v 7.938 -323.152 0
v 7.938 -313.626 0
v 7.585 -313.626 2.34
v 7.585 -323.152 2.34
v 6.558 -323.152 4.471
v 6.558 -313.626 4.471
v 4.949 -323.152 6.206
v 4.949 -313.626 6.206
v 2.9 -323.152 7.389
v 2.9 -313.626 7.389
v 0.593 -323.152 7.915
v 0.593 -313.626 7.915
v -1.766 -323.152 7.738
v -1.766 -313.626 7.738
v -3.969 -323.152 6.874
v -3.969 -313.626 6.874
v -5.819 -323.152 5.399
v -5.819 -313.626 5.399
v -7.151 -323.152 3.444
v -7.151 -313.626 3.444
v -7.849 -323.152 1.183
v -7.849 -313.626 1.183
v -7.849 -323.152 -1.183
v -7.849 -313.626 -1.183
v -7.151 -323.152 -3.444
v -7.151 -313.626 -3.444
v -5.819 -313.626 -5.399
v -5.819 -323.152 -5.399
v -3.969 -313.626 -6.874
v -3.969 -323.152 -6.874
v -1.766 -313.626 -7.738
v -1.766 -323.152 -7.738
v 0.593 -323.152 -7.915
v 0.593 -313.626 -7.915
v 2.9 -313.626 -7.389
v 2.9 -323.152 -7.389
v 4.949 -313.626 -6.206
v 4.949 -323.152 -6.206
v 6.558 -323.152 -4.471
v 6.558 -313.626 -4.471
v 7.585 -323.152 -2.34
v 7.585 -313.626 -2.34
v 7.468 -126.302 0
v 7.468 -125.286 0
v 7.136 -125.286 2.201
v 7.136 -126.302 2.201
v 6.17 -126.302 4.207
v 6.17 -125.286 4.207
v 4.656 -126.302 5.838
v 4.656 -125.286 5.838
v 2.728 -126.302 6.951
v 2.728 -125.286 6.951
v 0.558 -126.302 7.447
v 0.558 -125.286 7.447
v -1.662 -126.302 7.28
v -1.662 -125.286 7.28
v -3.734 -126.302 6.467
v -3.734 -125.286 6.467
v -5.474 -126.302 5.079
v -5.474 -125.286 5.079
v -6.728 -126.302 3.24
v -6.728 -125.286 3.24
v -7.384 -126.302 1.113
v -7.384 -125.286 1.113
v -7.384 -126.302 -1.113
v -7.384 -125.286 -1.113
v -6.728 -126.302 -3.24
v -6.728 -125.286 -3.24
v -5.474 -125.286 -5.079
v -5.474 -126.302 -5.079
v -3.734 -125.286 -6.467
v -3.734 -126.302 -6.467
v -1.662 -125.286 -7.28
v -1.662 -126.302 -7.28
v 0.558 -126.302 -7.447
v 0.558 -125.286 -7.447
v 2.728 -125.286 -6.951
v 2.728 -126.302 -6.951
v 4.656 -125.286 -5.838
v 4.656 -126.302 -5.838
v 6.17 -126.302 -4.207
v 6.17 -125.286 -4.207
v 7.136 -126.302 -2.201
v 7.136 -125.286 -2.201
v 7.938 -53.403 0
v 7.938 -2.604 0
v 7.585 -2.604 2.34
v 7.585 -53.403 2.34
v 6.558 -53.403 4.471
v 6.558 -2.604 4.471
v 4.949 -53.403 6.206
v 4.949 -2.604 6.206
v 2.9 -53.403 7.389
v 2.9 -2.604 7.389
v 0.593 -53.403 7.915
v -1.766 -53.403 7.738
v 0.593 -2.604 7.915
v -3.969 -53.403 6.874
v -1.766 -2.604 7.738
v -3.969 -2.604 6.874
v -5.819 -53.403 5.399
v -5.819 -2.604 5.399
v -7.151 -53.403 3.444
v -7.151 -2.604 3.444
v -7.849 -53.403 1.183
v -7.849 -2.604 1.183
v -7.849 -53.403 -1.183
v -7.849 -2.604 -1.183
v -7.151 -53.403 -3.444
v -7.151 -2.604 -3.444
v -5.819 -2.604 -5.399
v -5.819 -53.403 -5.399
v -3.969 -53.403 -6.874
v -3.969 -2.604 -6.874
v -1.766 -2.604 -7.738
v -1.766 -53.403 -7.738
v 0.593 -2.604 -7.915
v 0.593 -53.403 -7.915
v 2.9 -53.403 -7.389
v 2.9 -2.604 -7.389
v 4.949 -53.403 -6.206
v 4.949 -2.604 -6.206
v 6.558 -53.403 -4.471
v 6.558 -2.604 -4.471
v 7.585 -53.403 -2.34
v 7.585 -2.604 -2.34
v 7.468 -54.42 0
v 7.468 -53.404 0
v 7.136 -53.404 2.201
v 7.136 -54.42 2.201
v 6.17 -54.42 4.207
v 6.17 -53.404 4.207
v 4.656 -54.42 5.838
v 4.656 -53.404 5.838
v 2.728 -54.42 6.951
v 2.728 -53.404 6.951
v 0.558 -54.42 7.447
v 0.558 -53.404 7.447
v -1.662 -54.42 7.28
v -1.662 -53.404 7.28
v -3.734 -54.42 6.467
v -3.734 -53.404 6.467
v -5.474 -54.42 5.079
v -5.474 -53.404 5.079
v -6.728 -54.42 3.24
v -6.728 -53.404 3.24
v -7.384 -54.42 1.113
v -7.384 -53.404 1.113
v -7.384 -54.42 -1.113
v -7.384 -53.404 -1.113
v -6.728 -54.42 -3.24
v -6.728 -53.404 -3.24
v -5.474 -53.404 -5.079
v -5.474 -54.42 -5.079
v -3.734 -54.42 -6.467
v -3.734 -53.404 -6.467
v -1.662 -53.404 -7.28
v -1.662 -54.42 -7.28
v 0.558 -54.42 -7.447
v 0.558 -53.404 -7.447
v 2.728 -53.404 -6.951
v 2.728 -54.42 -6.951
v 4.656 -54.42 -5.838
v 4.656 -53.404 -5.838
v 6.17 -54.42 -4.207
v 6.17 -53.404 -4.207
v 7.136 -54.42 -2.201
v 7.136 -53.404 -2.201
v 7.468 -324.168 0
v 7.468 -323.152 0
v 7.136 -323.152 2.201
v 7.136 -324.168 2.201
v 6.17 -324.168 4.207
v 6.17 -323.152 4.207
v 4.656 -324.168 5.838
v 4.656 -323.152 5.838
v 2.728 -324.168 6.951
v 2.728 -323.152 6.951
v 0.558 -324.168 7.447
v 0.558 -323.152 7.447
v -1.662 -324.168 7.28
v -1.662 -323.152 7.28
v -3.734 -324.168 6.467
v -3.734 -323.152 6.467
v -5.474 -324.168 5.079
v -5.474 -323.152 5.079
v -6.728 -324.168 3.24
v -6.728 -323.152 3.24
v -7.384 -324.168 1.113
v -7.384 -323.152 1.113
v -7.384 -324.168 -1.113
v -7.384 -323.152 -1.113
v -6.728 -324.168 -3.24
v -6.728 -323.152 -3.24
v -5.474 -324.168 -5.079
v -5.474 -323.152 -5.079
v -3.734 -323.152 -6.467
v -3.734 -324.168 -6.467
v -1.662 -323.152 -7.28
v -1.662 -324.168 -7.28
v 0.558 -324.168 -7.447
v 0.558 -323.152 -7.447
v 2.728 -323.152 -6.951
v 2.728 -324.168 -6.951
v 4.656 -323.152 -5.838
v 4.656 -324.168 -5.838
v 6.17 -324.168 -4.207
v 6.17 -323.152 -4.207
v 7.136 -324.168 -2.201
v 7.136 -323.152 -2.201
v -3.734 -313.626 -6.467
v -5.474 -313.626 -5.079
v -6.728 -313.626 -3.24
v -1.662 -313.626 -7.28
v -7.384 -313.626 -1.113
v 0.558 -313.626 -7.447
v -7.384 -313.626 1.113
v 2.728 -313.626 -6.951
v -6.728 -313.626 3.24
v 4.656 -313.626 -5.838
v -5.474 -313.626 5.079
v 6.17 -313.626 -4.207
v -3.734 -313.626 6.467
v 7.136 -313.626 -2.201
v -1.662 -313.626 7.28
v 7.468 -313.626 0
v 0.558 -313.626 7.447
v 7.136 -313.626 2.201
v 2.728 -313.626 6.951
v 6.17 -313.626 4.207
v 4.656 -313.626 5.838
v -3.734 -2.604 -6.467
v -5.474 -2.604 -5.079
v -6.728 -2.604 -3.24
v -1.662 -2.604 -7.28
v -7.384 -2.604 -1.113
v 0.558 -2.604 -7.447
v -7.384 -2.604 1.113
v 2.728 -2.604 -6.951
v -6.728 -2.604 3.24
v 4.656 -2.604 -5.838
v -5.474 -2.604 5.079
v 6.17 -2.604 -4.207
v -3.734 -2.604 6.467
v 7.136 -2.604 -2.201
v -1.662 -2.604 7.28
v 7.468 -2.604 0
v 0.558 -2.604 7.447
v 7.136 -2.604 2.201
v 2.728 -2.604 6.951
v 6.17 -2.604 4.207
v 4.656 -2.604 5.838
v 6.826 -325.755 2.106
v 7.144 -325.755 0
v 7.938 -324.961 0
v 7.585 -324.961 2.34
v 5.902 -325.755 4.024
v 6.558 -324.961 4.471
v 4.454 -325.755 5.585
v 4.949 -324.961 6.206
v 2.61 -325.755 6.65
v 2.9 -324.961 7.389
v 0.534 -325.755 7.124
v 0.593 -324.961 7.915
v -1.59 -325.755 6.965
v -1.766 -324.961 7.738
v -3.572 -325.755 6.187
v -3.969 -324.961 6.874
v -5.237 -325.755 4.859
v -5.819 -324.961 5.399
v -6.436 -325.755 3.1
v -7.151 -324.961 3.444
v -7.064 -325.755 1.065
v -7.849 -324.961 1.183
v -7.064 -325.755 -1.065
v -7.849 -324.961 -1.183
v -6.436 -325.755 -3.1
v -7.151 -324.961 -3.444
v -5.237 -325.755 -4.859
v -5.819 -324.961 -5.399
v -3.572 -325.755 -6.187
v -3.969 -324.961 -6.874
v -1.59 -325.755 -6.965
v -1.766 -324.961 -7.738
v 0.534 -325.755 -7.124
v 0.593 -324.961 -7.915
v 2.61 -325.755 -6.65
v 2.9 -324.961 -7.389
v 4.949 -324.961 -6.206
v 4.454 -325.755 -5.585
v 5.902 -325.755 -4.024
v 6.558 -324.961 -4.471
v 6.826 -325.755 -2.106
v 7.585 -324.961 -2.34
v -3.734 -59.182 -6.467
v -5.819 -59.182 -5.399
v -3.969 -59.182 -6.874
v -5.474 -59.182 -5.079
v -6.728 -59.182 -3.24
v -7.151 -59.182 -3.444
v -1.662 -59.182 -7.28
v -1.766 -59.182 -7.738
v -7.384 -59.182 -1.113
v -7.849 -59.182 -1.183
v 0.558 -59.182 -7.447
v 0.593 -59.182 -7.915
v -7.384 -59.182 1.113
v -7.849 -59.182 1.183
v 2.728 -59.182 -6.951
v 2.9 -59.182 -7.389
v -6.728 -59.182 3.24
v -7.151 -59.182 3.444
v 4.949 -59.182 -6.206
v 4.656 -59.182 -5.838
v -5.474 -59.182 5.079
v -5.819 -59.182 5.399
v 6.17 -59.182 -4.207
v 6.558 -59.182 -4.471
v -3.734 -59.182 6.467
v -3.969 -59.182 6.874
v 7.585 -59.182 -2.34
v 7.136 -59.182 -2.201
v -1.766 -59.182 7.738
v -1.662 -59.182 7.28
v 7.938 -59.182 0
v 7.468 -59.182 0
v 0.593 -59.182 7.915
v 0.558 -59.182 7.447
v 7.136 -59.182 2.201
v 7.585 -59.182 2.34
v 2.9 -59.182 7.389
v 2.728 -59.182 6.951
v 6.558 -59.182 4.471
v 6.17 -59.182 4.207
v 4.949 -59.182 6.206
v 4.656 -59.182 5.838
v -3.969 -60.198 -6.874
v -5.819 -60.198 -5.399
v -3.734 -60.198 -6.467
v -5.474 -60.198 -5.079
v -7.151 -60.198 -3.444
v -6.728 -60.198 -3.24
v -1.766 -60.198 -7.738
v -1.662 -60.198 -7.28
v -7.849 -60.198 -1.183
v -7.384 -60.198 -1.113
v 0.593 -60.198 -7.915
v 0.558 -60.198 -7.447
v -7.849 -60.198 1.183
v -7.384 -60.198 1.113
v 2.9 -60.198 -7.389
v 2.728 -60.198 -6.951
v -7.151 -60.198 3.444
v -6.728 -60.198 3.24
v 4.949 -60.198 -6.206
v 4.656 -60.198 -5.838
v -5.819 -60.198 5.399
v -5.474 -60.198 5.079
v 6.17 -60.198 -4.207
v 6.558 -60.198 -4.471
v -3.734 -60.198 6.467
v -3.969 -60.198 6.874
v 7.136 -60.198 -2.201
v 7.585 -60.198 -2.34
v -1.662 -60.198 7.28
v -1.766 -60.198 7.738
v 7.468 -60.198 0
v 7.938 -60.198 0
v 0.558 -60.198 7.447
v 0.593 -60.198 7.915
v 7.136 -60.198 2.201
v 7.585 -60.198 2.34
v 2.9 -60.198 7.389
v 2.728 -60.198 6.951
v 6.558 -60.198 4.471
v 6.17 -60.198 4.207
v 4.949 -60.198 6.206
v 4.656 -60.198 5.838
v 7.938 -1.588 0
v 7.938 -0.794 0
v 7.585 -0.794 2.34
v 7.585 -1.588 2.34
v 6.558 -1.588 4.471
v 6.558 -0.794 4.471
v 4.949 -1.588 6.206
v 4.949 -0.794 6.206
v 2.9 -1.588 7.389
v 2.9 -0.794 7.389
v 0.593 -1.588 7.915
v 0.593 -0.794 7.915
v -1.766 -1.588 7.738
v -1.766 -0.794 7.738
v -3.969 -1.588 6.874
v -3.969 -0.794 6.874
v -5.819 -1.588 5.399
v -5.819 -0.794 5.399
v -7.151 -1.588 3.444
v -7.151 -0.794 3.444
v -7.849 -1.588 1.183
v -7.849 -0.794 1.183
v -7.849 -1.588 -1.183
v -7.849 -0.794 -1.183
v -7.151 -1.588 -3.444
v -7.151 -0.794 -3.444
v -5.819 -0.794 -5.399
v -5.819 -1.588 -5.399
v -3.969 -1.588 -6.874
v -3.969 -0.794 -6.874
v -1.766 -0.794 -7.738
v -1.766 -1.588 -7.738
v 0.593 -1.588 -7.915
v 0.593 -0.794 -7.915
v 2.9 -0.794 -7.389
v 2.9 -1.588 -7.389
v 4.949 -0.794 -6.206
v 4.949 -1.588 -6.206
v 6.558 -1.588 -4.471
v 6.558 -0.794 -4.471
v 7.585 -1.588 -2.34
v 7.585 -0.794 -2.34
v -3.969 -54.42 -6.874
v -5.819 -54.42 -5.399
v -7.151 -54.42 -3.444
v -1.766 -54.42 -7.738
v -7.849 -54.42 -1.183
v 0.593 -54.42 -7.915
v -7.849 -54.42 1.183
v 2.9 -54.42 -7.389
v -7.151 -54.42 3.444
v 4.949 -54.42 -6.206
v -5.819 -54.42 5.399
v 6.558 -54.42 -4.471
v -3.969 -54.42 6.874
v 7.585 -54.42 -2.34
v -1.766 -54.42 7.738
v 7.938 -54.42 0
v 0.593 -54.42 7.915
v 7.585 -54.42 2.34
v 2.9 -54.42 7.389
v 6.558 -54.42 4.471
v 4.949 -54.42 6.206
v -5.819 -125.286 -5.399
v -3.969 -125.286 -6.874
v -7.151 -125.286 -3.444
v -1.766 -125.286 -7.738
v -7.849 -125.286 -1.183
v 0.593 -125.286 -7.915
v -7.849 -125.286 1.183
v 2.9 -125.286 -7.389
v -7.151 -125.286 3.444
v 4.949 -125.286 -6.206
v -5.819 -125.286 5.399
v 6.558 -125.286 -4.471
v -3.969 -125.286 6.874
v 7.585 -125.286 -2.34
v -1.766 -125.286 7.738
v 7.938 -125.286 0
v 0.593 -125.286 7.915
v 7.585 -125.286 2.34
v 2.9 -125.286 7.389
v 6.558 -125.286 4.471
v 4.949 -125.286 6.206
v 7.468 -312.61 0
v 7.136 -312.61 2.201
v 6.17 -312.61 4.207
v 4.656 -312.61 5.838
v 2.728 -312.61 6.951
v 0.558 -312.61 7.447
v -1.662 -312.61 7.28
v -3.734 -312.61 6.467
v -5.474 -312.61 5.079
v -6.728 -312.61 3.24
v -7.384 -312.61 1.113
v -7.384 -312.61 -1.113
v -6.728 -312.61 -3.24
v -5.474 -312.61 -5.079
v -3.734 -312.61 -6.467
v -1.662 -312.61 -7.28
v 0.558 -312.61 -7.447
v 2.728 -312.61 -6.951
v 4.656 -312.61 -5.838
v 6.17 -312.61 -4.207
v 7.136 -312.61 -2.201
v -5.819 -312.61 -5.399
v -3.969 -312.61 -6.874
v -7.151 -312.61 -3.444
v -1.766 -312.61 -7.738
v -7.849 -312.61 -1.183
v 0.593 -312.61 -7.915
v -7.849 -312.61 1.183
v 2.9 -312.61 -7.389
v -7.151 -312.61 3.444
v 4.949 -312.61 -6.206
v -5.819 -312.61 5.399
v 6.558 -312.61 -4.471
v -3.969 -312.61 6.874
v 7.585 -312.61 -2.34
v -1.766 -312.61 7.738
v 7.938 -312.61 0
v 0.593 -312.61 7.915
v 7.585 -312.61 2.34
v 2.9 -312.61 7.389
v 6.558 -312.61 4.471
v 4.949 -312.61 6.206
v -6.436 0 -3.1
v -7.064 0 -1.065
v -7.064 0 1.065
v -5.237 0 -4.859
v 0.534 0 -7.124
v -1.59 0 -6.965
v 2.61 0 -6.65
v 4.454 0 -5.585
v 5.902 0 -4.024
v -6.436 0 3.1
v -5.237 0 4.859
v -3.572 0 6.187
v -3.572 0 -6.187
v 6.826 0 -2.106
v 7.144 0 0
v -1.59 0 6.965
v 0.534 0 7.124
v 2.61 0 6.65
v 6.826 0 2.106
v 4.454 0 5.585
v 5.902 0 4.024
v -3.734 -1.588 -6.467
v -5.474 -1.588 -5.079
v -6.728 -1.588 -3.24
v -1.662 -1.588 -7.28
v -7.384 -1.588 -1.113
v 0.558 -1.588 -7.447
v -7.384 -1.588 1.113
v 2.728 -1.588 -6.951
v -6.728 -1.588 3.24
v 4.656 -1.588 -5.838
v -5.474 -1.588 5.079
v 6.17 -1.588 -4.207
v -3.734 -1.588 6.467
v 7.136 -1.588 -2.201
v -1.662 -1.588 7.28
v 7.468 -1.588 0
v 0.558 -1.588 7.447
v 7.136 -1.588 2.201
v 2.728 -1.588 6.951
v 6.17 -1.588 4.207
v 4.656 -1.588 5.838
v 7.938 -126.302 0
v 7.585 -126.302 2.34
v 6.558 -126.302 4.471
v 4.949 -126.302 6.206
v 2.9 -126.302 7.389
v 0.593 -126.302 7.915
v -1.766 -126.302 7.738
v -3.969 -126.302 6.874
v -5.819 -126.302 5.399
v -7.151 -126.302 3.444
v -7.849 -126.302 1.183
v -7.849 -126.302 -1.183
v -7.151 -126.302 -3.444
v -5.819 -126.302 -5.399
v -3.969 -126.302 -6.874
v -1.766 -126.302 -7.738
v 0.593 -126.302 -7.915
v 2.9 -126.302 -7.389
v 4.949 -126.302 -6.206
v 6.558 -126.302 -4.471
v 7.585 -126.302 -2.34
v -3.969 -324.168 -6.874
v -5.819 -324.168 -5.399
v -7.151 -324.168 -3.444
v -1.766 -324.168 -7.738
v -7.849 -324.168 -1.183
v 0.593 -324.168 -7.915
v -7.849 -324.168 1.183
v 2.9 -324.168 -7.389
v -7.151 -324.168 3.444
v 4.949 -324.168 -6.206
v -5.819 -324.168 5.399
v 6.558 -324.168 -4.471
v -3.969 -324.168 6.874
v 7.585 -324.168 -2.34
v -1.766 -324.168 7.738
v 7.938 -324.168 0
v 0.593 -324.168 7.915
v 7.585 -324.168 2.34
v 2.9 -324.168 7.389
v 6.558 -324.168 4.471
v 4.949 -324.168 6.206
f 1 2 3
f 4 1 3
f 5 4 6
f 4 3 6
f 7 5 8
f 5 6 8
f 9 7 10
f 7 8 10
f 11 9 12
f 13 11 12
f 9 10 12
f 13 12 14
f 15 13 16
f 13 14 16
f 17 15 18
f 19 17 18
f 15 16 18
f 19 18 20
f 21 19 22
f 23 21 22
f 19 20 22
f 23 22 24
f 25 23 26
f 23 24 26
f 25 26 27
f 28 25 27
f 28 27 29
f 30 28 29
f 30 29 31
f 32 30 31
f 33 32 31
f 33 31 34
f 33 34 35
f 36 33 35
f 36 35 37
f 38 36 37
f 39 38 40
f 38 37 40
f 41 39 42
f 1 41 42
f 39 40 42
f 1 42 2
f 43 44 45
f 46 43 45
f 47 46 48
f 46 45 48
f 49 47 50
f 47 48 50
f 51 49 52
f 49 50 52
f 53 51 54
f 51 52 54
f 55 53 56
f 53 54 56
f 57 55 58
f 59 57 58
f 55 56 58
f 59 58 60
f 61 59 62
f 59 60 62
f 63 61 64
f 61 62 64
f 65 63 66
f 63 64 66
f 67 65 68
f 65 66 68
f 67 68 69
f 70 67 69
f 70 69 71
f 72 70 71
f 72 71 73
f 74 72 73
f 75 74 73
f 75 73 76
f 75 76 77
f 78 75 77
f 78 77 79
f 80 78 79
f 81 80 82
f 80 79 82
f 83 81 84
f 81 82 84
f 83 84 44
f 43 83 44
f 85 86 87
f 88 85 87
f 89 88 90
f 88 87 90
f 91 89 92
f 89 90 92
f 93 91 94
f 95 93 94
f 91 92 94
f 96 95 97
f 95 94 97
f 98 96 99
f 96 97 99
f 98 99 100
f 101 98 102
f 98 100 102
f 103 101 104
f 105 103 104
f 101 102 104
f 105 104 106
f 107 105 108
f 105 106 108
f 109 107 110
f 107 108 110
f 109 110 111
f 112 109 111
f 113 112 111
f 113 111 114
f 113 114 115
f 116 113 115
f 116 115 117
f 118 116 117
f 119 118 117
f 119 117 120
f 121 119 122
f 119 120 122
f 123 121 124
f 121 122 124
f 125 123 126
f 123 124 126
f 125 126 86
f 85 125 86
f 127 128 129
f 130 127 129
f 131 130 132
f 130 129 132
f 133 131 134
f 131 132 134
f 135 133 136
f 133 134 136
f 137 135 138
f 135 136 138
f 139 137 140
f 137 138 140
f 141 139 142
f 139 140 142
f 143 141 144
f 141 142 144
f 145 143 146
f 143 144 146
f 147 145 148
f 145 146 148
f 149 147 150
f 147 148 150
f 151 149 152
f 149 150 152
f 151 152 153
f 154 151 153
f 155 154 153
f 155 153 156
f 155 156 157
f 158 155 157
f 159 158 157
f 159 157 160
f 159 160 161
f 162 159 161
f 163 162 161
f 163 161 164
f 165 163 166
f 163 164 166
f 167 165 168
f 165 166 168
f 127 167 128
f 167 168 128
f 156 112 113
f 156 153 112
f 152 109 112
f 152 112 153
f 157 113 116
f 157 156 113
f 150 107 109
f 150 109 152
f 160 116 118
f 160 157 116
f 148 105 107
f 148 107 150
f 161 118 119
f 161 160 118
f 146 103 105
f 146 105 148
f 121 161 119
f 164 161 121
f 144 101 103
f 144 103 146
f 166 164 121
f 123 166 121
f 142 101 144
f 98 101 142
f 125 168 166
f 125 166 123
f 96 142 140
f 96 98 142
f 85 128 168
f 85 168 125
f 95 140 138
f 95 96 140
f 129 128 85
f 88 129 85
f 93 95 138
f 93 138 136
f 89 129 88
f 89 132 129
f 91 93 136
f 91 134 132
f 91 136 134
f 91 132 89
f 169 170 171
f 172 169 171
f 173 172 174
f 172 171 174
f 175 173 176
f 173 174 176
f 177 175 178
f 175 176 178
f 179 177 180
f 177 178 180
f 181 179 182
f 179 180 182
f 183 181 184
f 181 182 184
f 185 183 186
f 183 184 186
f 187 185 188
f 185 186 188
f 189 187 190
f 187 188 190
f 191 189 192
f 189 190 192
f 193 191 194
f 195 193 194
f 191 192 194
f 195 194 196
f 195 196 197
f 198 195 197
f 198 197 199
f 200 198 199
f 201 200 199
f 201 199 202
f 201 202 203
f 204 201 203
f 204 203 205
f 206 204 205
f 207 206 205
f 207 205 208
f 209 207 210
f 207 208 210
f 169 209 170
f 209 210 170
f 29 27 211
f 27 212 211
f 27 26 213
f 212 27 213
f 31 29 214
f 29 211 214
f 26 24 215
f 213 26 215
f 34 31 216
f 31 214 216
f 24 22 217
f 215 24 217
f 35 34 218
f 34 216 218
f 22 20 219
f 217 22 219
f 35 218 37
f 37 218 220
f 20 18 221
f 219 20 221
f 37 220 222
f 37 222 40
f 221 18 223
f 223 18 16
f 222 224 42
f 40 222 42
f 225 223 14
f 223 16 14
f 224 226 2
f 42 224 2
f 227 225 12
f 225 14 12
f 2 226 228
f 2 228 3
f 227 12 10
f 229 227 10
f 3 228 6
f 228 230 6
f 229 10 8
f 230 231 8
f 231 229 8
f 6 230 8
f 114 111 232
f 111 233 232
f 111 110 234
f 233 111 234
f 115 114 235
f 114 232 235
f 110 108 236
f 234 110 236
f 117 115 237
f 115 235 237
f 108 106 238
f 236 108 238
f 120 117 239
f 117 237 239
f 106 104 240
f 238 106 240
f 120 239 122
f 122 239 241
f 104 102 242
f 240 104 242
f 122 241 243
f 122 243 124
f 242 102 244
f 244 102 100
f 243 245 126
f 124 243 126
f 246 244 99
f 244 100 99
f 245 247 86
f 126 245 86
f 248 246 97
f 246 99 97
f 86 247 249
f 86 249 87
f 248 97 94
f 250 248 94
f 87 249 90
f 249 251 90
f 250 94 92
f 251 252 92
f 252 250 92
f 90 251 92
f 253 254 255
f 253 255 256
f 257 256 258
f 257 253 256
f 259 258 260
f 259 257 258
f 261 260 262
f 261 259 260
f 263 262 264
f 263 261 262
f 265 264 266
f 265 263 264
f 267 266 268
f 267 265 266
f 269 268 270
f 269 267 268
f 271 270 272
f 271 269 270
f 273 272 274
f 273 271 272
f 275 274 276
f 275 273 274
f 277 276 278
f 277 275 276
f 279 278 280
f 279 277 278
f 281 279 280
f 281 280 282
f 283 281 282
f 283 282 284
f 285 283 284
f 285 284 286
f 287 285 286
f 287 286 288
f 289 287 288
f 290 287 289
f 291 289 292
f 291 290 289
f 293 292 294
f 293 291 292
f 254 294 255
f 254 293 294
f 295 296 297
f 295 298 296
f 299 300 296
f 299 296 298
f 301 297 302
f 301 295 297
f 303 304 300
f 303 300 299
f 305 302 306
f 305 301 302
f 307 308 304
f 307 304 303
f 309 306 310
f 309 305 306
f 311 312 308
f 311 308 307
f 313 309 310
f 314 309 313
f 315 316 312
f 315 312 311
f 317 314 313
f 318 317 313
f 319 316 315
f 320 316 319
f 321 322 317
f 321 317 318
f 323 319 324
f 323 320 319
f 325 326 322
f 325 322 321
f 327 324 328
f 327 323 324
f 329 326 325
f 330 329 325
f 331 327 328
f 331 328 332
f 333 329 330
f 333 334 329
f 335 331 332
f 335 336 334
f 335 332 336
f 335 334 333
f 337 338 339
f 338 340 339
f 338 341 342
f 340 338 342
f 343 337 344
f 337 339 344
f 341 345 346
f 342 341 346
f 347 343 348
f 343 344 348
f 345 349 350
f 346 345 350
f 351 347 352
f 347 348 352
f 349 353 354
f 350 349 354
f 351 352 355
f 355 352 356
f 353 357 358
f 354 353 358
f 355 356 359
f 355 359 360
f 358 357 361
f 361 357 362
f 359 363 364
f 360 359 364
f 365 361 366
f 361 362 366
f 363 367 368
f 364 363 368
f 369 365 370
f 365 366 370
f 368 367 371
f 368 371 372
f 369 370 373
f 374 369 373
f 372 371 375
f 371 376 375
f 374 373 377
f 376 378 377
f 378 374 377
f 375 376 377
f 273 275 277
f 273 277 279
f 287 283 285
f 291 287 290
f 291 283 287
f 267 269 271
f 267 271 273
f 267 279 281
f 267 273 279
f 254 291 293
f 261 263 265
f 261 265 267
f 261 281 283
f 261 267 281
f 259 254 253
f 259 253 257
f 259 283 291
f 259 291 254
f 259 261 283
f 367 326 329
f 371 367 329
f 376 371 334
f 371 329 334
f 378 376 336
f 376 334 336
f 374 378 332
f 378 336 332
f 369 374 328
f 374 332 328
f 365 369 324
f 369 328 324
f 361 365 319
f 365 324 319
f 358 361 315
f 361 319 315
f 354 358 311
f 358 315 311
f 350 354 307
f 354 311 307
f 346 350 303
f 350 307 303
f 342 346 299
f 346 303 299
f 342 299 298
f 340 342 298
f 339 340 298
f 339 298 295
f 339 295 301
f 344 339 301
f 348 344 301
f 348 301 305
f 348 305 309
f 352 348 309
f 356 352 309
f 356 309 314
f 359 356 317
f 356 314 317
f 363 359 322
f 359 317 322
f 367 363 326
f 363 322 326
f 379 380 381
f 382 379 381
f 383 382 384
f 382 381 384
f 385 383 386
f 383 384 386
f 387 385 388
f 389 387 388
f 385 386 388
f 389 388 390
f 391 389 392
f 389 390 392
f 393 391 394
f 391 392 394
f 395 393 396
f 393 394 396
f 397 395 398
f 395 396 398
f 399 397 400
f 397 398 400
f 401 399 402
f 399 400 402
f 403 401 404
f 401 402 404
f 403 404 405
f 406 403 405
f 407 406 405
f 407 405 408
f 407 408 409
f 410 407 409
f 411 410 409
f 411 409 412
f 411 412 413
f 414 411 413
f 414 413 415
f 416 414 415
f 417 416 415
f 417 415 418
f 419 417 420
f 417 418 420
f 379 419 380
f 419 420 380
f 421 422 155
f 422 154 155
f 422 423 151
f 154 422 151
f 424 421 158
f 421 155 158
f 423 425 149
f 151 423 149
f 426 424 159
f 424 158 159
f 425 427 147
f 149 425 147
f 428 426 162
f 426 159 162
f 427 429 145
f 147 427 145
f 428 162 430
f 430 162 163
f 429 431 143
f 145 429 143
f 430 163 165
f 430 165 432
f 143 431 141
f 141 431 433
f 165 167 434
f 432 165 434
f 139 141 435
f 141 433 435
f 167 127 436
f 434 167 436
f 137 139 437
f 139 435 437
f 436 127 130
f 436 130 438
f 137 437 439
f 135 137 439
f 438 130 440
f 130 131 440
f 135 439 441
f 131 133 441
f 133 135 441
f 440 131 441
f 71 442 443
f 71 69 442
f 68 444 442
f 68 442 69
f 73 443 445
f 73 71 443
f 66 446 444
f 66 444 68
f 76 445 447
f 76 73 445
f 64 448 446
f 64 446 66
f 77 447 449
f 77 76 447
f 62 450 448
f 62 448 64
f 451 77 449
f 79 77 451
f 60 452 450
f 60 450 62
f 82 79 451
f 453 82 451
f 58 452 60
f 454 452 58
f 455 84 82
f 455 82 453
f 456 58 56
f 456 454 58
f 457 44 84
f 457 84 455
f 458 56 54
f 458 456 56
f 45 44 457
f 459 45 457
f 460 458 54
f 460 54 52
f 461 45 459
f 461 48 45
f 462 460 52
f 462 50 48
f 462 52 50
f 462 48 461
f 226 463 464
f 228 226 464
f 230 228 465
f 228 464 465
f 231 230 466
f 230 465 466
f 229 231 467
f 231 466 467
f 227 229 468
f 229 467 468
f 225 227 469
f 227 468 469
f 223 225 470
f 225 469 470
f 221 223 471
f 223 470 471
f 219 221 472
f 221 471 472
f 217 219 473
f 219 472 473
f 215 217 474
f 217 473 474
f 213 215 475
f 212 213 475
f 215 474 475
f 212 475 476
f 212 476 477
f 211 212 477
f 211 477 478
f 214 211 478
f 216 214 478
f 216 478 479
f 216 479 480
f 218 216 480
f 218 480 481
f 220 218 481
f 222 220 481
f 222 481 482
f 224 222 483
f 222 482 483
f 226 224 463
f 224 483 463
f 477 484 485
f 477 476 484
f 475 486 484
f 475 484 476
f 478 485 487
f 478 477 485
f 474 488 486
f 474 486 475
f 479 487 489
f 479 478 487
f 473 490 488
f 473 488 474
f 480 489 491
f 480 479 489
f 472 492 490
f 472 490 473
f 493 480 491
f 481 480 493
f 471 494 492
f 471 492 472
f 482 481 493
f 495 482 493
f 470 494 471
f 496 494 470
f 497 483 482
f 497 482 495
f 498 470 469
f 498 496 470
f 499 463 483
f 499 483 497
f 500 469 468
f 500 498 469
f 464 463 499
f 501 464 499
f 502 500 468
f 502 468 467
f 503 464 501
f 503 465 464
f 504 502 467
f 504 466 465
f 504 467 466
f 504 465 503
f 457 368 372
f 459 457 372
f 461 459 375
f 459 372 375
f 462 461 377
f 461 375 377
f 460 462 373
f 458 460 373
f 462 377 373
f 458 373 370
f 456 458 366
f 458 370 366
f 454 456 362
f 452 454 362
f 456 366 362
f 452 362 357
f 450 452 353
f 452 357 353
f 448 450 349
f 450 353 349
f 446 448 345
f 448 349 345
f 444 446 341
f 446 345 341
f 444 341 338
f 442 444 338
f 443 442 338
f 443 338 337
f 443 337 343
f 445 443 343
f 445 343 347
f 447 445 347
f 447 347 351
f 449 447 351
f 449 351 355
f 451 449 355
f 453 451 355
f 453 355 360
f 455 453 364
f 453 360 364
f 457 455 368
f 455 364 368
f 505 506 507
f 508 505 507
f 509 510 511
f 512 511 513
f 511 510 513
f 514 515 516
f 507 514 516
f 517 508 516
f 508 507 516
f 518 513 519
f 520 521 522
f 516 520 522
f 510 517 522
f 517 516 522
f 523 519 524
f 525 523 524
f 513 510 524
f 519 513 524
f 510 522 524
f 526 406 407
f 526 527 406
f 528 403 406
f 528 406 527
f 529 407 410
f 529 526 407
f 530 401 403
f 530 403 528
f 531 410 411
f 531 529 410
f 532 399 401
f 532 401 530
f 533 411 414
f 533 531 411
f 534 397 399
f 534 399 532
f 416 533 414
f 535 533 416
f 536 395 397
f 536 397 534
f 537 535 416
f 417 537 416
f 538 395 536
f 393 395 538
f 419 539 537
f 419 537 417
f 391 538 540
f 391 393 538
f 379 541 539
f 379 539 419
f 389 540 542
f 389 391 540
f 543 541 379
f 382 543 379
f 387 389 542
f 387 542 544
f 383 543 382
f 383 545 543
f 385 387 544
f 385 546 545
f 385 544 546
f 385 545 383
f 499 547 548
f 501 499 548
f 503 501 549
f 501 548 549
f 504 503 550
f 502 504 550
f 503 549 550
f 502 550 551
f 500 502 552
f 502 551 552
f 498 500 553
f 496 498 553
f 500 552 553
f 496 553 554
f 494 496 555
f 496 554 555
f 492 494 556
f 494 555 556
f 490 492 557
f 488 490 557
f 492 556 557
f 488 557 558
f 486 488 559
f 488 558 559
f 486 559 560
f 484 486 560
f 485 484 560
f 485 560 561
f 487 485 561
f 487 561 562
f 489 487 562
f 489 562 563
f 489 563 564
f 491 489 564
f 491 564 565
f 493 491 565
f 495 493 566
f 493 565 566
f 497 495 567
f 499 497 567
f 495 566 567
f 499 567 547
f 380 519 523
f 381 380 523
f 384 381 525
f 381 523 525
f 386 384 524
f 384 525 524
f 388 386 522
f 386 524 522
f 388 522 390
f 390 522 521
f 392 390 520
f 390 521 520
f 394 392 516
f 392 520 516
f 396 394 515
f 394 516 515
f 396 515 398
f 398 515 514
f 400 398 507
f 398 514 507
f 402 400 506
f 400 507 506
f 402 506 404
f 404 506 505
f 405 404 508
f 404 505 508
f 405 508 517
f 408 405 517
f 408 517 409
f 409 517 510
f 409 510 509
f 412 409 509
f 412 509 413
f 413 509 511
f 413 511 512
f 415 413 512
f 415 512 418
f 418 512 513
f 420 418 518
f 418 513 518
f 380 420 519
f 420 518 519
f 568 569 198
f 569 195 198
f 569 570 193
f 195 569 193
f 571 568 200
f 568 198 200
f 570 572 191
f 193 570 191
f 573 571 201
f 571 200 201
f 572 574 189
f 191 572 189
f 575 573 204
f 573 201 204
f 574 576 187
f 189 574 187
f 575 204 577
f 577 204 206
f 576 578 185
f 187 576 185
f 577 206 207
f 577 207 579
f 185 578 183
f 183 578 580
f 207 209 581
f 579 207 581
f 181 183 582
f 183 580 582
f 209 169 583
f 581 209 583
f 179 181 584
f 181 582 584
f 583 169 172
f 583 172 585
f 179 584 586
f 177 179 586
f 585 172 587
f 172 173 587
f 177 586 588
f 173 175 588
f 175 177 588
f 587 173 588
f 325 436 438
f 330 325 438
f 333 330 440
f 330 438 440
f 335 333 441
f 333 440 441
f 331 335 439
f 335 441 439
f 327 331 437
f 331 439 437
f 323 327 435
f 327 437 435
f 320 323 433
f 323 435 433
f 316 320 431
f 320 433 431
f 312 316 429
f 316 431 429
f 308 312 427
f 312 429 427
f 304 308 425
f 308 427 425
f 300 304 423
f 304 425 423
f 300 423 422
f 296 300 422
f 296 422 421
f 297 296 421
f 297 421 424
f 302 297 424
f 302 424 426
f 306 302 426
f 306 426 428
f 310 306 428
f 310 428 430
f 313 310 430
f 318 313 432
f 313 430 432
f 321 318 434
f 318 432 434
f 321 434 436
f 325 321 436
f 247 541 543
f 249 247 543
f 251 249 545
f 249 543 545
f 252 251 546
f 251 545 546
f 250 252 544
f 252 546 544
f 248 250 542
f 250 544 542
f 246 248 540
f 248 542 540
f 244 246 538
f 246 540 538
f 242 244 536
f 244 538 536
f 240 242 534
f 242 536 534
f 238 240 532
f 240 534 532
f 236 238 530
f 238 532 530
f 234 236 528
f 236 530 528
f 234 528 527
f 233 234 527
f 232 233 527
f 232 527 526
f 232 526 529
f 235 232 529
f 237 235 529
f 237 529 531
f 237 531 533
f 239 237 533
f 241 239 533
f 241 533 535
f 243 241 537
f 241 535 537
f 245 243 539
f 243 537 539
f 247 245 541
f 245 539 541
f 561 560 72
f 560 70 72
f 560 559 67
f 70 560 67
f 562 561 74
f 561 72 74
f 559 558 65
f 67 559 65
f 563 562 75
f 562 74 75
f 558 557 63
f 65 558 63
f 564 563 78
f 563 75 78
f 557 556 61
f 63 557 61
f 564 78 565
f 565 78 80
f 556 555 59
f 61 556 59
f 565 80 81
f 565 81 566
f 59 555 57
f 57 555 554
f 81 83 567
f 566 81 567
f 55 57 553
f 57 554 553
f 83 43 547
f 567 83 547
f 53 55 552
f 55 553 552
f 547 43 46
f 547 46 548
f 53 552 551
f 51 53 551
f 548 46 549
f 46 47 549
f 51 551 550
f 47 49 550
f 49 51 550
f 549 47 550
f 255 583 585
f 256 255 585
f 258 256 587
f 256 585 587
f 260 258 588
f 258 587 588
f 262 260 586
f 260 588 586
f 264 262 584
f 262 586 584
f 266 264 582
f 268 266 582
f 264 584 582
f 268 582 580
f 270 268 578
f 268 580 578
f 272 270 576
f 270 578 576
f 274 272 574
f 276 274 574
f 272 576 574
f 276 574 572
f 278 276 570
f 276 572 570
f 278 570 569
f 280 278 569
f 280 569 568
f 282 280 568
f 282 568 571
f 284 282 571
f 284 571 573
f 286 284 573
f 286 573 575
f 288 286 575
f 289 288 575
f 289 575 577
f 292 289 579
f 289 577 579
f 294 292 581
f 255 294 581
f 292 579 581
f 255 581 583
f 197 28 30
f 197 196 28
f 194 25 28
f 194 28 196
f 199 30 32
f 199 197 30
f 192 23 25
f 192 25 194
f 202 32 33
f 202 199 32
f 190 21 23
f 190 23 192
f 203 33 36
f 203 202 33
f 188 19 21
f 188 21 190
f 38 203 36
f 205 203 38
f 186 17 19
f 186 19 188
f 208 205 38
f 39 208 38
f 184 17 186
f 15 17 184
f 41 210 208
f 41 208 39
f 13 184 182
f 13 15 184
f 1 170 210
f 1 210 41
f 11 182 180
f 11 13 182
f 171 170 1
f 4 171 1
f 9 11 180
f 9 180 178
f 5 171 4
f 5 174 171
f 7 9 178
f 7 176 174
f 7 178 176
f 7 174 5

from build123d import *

# Parameters (mm, degrees)
F0_R      = 7.9375
F1_DEPTH  = 1.5875
F2_R      = 7.4676
F3_DEPTH  = 1.016
F4_R      = 7.9375
F5_DEPTH  = 50.8
F6_R      = 7.4676
F7_DEPTH  = 1.016
F8_R      = 7.9375
F9_DEPTH  = 4.7625
F10_R     = 7.4676
F11_DEPTH = 1.016
F12_R     = 7.9375
F13_DEPTH = 65.0875
F14_R     = 7.4676
F15_DEPTH = 1.016
F16_R     = 7.9375
F17_DEPTH = 186.309
F18_R     = 7.4676
F19_DEPTH = 1.016
F20_R     = 7.9375
F21_DEPTH = 9.525
F22_R     = 7.4676
F23_DEPTH = 1.016
F24_R     = 7.9375
F25_DEPTH = 1.5875
F26_SIZE  = 0.79375


with BuildPart() as f1:
    # F0 (on Front) → F1 (new body)
    with BuildSketch(Plane.XZ):
        Circle(F0_R)
    extrude(amount=F1_DEPTH)

    # F2 (on face) → F3 (join)
    with BuildSketch(Plane.XZ.offset(1.5875)):
        Circle(F2_R)
    extrude(amount=F3_DEPTH)

    # F4 (on face) → F5 (join)
    with BuildSketch(Plane.XZ.offset(2.6035)):
        Circle(F4_R)
    extrude(amount=F5_DEPTH)

    # F6 (on face) → F7 (join)
    with BuildSketch(Plane.XZ.offset(53.4035)):
        Circle(F6_R)
    extrude(amount=F7_DEPTH)

    # F8 (on face) → F9 (join)
    with BuildSketch(Plane.XZ.offset(54.4195)):
        Circle(F8_R)
    extrude(amount=F9_DEPTH)

    # F10 (on face) → F11 (join)
    with BuildSketch(Plane.XZ.offset(59.182)):
        Circle(F10_R)
    extrude(amount=F11_DEPTH)

    # F12 (on face) → F13 (join)
    with BuildSketch(Plane.XZ.offset(60.198)):
        Circle(F12_R)
    extrude(amount=F13_DEPTH)

    # F14 (on face) → F15 (join)
    with BuildSketch(Plane.XZ.offset(125.2855)):
        Circle(F14_R)
    extrude(amount=F15_DEPTH)

    # F16 (on face) → F17 (join)
    with BuildSketch(Plane.XZ.offset(126.3015)):
        Circle(F16_R)
    extrude(amount=F17_DEPTH)

    # F18 (on face) → F19 (join)
    with BuildSketch(Plane.XZ.offset(312.6105)):
        Circle(F18_R)
    extrude(amount=F19_DEPTH)

    # F20 (on face) → F21 (join)
    with BuildSketch(Plane.XZ.offset(313.6265)):
        Circle(F20_R)
    extrude(amount=F21_DEPTH)

    # F22 (on face) → F23 (join)
    with BuildSketch(Plane.XZ.offset(323.1515)):
        Circle(F22_R)
    extrude(amount=F23_DEPTH)

    # F24 (on face) → F25 (join)
    with BuildSketch(Plane.XZ.offset(324.1675)):
        Circle(F24_R)
    extrude(amount=F25_DEPTH)

    # F26
    f26_edges = [f1.edges().sort_by_distance(p)[0] for p in [
        (-7.9375, -325.755, 0),
        (-7.9375, 0, 0),
    ]]
    chamfer(f26_edges, length=F26_SIZE)


solid = f1.part
